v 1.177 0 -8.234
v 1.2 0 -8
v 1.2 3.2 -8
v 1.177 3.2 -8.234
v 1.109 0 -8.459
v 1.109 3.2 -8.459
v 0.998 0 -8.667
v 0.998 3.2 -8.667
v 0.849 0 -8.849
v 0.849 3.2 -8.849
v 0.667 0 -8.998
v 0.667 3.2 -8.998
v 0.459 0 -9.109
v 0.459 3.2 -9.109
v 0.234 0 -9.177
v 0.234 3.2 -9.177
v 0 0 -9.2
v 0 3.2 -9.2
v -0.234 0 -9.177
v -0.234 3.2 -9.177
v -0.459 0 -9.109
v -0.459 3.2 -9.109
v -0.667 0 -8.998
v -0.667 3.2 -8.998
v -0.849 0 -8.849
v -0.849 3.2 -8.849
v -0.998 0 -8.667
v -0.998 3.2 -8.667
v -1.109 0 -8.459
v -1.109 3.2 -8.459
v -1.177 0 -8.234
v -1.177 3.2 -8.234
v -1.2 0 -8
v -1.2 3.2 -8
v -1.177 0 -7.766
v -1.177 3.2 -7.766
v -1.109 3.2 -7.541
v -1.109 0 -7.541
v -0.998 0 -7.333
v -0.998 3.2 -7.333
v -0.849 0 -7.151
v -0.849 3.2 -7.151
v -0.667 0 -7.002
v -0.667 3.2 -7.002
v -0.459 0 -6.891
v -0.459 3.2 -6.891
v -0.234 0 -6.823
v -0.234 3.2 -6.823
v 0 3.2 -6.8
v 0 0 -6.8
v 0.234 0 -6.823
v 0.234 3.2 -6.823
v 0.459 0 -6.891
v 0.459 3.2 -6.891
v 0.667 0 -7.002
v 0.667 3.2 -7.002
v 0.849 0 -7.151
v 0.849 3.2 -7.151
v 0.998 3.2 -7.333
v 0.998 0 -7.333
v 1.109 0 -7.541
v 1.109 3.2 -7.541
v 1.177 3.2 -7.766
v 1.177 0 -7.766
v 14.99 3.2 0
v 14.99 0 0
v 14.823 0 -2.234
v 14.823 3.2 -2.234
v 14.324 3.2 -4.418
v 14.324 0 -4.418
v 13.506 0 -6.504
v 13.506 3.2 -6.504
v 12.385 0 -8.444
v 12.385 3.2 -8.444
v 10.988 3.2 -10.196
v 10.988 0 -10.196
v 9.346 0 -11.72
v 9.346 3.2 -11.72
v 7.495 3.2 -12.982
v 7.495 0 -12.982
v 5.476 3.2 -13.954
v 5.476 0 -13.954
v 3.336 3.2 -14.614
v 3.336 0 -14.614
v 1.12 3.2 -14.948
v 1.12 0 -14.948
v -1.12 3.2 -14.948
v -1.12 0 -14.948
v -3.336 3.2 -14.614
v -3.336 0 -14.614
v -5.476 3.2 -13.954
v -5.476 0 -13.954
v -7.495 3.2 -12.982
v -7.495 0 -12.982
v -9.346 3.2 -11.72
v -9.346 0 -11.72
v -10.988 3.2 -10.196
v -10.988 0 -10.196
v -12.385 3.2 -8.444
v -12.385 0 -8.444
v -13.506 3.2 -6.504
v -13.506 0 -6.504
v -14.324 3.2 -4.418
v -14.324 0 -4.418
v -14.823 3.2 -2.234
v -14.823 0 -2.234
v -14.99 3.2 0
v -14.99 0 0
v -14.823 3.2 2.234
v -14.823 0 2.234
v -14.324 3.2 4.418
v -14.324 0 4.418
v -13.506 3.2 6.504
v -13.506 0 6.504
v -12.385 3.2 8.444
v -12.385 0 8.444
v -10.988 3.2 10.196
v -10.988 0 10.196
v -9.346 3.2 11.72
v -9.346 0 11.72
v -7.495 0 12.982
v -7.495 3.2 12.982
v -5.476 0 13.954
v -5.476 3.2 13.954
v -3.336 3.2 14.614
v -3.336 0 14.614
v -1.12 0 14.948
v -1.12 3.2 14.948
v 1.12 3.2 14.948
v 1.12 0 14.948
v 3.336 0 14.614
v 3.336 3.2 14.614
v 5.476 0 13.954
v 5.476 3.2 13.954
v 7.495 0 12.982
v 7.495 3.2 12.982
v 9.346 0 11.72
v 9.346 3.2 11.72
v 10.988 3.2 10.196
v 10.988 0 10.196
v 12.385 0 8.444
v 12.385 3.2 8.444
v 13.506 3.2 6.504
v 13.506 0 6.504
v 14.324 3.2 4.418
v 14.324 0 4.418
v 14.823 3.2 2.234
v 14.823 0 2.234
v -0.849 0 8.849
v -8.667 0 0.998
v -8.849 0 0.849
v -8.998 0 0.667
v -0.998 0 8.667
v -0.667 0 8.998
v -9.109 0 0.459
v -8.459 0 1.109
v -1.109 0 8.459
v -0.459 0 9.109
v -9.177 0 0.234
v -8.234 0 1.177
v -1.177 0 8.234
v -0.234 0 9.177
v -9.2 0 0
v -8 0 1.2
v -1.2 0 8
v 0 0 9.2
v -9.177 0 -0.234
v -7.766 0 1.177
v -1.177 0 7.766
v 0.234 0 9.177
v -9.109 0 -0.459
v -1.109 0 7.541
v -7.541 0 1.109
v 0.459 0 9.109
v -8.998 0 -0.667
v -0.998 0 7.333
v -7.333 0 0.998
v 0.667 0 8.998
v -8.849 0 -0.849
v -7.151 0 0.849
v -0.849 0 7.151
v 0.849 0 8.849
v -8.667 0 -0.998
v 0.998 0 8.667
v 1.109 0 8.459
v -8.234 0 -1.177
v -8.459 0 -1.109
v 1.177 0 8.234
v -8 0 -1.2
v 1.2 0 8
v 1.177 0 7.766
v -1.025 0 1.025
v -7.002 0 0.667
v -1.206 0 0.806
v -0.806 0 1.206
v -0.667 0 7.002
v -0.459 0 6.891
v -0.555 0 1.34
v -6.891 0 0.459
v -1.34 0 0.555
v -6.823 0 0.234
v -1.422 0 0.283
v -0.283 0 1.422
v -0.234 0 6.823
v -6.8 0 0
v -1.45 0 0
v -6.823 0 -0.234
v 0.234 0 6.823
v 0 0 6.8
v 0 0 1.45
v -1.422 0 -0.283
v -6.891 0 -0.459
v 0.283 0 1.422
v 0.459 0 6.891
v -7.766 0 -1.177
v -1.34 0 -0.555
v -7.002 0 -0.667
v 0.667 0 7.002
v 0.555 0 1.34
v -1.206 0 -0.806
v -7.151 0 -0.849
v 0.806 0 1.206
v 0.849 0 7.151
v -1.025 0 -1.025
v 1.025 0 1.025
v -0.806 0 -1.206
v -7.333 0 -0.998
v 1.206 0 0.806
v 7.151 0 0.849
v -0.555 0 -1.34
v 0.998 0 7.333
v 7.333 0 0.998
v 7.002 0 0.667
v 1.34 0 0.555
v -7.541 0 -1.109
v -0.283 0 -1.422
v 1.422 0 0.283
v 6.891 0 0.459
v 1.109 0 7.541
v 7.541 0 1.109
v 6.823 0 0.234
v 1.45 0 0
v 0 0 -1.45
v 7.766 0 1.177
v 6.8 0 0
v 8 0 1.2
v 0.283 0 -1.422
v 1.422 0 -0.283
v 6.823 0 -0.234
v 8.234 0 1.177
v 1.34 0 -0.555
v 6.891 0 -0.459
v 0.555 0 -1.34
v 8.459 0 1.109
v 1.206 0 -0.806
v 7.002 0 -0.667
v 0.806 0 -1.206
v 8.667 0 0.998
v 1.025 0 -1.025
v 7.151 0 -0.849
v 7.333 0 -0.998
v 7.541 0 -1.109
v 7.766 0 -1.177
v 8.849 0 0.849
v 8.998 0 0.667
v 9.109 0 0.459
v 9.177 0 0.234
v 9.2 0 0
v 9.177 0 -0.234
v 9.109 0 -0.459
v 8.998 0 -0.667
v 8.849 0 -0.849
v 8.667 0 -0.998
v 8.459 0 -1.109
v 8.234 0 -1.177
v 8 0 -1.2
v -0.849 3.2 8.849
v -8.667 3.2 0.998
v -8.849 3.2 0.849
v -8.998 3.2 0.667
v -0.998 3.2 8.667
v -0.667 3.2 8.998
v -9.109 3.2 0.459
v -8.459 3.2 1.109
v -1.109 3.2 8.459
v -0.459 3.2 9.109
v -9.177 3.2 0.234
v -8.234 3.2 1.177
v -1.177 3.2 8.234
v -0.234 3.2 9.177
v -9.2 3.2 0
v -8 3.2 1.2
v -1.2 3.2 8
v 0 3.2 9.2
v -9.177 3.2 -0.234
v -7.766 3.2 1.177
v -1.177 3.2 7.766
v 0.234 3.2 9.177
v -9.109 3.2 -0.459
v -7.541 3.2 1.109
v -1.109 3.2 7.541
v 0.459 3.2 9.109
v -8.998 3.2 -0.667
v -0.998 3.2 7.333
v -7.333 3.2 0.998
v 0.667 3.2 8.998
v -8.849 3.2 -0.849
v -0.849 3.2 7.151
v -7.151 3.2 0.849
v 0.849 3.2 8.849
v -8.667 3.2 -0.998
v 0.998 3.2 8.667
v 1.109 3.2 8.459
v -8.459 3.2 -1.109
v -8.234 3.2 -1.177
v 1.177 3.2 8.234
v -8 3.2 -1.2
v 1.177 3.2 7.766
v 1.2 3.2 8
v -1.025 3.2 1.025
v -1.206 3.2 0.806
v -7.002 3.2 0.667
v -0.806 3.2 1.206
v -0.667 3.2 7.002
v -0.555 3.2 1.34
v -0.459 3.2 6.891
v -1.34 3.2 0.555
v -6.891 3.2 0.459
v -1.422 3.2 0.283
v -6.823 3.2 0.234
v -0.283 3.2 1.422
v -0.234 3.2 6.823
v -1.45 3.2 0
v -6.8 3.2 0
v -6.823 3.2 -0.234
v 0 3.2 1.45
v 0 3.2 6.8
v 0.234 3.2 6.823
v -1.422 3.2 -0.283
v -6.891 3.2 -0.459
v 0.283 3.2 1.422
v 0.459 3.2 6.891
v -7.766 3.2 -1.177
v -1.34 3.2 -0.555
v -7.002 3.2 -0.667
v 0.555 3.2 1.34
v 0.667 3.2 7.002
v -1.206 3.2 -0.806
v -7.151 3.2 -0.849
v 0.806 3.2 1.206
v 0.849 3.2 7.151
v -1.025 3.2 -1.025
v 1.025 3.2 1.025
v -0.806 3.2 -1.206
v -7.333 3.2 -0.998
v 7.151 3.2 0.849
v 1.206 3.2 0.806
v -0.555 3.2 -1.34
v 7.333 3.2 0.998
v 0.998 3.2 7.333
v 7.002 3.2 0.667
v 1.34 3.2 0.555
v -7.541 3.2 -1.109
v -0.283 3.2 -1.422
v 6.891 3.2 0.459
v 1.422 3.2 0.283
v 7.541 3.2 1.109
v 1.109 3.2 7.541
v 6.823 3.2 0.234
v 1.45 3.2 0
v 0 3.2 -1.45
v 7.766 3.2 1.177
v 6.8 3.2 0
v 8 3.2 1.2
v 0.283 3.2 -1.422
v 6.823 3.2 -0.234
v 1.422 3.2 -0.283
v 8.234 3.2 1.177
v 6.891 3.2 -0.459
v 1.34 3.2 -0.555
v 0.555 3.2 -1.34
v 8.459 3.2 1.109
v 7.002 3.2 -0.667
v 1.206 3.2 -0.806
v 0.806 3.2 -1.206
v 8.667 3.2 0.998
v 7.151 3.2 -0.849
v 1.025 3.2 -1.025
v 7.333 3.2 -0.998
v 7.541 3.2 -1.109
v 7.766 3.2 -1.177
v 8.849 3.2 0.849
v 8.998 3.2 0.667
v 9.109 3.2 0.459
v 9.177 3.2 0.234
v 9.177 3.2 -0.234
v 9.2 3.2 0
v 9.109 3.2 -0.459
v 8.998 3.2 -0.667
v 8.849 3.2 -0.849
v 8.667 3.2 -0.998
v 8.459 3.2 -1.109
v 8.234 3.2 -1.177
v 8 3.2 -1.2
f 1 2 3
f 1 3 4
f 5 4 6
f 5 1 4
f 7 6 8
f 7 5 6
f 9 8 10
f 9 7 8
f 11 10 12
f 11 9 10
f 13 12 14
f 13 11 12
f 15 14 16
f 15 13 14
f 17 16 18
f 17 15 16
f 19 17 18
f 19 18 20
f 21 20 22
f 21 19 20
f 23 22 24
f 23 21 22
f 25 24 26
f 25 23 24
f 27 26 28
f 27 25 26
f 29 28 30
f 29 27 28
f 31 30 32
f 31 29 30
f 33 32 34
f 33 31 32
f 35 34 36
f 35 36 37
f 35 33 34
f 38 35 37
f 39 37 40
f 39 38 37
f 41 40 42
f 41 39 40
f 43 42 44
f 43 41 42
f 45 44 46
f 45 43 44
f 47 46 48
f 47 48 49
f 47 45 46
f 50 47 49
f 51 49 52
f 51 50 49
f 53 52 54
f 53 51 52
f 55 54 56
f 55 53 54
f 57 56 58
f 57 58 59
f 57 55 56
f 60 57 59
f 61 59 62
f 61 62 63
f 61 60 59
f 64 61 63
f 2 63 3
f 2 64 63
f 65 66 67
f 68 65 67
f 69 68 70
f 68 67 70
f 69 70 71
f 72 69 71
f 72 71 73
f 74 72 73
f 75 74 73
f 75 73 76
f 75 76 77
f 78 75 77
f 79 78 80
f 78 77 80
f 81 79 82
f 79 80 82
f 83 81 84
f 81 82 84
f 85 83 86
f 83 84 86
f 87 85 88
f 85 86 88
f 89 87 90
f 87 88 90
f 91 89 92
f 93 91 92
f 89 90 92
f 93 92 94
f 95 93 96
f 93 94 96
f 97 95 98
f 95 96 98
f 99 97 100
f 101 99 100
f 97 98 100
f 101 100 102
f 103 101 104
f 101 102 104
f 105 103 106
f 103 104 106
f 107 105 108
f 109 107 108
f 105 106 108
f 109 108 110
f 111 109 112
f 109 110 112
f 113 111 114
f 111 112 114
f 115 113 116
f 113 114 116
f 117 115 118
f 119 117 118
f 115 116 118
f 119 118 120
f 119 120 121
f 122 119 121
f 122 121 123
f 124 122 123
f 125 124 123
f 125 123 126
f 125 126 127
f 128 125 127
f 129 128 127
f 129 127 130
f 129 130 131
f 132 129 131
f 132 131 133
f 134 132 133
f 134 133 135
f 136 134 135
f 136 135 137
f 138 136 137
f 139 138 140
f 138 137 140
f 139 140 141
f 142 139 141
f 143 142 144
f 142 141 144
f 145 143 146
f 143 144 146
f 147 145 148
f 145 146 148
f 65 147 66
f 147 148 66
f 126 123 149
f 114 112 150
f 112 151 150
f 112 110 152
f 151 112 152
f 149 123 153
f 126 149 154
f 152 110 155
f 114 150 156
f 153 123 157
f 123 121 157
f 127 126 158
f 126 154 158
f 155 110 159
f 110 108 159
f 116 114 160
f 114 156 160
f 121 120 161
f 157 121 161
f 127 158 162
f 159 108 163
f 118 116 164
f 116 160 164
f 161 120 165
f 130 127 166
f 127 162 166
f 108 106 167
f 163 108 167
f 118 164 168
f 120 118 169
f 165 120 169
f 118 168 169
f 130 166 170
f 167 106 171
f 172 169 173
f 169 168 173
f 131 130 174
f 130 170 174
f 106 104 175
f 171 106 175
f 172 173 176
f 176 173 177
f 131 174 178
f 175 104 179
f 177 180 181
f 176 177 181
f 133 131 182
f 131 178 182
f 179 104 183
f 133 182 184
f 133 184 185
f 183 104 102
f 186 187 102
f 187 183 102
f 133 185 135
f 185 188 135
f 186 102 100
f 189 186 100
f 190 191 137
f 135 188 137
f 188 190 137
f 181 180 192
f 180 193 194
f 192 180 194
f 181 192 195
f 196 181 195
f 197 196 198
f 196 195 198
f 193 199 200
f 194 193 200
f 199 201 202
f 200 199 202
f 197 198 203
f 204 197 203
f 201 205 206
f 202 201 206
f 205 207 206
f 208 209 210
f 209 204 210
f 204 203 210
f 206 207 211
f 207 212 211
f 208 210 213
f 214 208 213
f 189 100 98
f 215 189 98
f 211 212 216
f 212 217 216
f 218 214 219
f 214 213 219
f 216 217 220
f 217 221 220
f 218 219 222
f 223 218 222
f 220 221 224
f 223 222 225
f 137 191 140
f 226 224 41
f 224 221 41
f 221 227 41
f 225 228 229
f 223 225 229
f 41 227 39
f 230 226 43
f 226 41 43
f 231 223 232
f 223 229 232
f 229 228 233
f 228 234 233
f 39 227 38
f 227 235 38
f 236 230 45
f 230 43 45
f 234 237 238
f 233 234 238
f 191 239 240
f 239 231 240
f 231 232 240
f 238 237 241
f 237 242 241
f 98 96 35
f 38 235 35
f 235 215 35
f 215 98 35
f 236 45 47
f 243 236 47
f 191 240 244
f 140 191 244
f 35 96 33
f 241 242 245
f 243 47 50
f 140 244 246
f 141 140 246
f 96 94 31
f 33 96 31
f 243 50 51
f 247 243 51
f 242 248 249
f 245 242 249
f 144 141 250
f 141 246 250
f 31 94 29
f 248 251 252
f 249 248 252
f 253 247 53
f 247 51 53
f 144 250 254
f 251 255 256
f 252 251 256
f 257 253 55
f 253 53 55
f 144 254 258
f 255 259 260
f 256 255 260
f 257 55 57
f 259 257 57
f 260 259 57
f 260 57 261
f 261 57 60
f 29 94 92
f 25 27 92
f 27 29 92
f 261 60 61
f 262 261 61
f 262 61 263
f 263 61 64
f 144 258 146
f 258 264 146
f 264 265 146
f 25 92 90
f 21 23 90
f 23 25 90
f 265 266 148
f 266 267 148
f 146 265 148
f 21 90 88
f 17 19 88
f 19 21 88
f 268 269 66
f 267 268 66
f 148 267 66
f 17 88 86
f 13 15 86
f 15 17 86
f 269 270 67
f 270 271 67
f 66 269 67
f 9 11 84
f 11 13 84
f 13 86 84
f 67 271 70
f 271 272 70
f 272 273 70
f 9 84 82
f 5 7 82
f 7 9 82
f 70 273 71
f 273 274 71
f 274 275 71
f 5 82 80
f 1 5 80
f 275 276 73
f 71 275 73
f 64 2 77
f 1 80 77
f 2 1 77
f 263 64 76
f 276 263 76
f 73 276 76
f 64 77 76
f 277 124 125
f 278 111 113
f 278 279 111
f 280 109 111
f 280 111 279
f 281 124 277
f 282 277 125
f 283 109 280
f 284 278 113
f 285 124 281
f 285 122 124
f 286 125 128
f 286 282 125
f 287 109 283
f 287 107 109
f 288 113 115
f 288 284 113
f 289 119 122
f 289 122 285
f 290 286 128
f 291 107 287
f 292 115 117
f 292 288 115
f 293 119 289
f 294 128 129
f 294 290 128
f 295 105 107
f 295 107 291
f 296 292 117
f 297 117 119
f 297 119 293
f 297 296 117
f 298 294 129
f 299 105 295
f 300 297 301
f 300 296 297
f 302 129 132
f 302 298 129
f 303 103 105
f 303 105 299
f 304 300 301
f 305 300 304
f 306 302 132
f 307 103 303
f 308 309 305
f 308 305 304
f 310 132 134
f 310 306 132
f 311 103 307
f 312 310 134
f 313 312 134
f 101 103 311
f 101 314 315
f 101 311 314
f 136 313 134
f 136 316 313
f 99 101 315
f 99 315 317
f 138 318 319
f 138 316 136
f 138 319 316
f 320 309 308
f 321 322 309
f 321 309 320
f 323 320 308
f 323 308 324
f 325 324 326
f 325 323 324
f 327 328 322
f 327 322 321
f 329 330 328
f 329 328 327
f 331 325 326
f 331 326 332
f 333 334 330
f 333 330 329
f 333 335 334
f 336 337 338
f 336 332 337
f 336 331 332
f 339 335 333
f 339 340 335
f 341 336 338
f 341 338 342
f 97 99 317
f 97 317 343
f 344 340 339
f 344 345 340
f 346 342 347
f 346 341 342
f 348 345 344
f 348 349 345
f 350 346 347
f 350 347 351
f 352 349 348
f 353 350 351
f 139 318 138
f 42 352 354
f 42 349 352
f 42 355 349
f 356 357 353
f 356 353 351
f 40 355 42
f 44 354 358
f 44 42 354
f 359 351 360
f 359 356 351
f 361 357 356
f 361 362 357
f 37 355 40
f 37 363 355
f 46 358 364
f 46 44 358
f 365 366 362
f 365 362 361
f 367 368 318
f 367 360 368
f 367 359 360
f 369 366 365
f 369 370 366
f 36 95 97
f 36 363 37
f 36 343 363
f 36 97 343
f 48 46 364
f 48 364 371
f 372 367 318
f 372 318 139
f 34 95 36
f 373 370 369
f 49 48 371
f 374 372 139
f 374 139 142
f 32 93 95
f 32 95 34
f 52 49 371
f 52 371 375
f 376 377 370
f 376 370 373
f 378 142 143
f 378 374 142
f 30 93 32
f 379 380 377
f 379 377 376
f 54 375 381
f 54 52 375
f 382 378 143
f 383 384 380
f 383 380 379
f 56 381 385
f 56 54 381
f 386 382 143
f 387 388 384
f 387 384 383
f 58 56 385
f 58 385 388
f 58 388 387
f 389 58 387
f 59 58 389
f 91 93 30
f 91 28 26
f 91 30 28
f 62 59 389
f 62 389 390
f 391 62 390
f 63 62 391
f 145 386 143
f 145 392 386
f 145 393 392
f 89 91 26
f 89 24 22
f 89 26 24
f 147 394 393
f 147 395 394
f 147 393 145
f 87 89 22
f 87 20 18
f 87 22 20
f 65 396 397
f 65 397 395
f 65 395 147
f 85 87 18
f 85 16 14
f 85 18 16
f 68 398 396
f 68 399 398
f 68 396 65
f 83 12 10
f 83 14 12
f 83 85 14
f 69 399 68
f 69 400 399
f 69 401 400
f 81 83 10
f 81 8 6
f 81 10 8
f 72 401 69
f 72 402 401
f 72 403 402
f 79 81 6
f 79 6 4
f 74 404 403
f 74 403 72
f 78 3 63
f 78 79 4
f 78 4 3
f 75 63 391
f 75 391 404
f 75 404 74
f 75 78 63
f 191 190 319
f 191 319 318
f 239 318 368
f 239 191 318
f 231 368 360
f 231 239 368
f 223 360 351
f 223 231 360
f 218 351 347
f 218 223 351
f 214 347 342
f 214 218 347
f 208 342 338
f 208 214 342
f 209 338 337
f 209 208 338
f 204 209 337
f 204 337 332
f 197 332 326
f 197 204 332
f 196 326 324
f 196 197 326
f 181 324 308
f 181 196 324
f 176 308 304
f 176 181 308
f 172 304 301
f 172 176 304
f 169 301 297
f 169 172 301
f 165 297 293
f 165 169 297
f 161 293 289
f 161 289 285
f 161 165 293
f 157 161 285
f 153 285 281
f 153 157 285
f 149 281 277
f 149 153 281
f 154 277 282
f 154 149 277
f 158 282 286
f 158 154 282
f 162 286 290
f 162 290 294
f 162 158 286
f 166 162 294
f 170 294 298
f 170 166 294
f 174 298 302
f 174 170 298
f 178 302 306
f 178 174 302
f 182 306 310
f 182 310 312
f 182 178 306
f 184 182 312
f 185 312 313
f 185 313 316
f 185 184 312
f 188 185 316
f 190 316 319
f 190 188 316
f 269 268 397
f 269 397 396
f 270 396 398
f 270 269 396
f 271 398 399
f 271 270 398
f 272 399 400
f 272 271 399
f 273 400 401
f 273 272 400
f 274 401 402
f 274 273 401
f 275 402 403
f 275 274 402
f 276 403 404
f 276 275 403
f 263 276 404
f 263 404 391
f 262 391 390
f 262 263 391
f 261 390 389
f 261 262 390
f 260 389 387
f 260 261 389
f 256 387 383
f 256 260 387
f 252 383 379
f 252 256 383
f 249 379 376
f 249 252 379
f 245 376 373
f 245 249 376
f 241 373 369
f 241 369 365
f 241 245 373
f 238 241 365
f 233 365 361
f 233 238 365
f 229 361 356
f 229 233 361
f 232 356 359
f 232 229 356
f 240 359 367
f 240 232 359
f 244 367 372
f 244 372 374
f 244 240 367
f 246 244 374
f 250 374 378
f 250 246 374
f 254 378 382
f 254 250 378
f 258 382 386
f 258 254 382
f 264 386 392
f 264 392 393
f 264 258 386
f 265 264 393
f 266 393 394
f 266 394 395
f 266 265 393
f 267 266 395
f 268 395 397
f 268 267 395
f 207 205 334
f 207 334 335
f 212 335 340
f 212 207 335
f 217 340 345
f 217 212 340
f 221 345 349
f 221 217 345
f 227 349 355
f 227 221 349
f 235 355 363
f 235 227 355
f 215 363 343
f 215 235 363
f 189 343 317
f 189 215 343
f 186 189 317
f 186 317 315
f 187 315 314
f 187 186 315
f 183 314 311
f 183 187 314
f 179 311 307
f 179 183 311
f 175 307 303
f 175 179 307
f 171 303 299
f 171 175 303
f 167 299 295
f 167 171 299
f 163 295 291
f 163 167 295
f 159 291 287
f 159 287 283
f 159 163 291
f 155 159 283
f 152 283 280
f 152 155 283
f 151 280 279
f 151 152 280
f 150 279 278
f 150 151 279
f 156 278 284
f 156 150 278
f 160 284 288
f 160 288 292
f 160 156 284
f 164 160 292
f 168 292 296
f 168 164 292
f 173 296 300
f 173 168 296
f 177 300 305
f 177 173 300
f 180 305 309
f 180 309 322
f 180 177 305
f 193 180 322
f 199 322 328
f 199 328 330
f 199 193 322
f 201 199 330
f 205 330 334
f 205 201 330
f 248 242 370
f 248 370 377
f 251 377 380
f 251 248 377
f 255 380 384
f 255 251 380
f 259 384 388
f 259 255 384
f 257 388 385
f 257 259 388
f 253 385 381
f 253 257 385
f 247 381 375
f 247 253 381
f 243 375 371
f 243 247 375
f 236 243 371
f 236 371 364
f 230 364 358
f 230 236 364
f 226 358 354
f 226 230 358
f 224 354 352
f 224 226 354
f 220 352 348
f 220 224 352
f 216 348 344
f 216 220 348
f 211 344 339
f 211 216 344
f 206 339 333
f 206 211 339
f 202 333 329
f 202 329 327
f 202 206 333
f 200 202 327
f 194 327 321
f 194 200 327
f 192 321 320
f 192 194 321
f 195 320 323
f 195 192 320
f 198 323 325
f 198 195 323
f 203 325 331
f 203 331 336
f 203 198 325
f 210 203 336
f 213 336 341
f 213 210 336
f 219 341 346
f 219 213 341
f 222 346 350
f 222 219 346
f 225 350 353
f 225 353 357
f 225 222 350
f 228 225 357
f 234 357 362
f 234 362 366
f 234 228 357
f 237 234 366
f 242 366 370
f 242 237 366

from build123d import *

# Parameters (mm, degrees)
SKETCH1_R           = 14.99
SKETCH1_R_2         = 1.45
SKETCH1_R_3         = 1.2
BOSS_EXTRUDE1_DEPTH = 3.2


with BuildPart() as part:
    # Sketch1 → Boss-Extrude1 (new body)
    with BuildSketch(Plane(origin=(0, 0, 0), x_dir=(1, 0, 0), z_dir=(0, 1, 0))):
        Circle(SKETCH1_R)
        Circle(SKETCH1_R_2, mode=Mode.SUBTRACT)
        with Locations((0, 8)):
            Circle(SKETCH1_R_3, mode=Mode.SUBTRACT)
        with Locations((8, 0)):
            Circle(SKETCH1_R_3, mode=Mode.SUBTRACT)
        with Locations((0, -8)):
            Circle(SKETCH1_R_3, mode=Mode.SUBTRACT)
        with Locations((-8, 0)):
            Circle(SKETCH1_R_3, mode=Mode.SUBTRACT)
    extrude(amount=BOSS_EXTRUDE1_DEPTH)


solid = part.part
